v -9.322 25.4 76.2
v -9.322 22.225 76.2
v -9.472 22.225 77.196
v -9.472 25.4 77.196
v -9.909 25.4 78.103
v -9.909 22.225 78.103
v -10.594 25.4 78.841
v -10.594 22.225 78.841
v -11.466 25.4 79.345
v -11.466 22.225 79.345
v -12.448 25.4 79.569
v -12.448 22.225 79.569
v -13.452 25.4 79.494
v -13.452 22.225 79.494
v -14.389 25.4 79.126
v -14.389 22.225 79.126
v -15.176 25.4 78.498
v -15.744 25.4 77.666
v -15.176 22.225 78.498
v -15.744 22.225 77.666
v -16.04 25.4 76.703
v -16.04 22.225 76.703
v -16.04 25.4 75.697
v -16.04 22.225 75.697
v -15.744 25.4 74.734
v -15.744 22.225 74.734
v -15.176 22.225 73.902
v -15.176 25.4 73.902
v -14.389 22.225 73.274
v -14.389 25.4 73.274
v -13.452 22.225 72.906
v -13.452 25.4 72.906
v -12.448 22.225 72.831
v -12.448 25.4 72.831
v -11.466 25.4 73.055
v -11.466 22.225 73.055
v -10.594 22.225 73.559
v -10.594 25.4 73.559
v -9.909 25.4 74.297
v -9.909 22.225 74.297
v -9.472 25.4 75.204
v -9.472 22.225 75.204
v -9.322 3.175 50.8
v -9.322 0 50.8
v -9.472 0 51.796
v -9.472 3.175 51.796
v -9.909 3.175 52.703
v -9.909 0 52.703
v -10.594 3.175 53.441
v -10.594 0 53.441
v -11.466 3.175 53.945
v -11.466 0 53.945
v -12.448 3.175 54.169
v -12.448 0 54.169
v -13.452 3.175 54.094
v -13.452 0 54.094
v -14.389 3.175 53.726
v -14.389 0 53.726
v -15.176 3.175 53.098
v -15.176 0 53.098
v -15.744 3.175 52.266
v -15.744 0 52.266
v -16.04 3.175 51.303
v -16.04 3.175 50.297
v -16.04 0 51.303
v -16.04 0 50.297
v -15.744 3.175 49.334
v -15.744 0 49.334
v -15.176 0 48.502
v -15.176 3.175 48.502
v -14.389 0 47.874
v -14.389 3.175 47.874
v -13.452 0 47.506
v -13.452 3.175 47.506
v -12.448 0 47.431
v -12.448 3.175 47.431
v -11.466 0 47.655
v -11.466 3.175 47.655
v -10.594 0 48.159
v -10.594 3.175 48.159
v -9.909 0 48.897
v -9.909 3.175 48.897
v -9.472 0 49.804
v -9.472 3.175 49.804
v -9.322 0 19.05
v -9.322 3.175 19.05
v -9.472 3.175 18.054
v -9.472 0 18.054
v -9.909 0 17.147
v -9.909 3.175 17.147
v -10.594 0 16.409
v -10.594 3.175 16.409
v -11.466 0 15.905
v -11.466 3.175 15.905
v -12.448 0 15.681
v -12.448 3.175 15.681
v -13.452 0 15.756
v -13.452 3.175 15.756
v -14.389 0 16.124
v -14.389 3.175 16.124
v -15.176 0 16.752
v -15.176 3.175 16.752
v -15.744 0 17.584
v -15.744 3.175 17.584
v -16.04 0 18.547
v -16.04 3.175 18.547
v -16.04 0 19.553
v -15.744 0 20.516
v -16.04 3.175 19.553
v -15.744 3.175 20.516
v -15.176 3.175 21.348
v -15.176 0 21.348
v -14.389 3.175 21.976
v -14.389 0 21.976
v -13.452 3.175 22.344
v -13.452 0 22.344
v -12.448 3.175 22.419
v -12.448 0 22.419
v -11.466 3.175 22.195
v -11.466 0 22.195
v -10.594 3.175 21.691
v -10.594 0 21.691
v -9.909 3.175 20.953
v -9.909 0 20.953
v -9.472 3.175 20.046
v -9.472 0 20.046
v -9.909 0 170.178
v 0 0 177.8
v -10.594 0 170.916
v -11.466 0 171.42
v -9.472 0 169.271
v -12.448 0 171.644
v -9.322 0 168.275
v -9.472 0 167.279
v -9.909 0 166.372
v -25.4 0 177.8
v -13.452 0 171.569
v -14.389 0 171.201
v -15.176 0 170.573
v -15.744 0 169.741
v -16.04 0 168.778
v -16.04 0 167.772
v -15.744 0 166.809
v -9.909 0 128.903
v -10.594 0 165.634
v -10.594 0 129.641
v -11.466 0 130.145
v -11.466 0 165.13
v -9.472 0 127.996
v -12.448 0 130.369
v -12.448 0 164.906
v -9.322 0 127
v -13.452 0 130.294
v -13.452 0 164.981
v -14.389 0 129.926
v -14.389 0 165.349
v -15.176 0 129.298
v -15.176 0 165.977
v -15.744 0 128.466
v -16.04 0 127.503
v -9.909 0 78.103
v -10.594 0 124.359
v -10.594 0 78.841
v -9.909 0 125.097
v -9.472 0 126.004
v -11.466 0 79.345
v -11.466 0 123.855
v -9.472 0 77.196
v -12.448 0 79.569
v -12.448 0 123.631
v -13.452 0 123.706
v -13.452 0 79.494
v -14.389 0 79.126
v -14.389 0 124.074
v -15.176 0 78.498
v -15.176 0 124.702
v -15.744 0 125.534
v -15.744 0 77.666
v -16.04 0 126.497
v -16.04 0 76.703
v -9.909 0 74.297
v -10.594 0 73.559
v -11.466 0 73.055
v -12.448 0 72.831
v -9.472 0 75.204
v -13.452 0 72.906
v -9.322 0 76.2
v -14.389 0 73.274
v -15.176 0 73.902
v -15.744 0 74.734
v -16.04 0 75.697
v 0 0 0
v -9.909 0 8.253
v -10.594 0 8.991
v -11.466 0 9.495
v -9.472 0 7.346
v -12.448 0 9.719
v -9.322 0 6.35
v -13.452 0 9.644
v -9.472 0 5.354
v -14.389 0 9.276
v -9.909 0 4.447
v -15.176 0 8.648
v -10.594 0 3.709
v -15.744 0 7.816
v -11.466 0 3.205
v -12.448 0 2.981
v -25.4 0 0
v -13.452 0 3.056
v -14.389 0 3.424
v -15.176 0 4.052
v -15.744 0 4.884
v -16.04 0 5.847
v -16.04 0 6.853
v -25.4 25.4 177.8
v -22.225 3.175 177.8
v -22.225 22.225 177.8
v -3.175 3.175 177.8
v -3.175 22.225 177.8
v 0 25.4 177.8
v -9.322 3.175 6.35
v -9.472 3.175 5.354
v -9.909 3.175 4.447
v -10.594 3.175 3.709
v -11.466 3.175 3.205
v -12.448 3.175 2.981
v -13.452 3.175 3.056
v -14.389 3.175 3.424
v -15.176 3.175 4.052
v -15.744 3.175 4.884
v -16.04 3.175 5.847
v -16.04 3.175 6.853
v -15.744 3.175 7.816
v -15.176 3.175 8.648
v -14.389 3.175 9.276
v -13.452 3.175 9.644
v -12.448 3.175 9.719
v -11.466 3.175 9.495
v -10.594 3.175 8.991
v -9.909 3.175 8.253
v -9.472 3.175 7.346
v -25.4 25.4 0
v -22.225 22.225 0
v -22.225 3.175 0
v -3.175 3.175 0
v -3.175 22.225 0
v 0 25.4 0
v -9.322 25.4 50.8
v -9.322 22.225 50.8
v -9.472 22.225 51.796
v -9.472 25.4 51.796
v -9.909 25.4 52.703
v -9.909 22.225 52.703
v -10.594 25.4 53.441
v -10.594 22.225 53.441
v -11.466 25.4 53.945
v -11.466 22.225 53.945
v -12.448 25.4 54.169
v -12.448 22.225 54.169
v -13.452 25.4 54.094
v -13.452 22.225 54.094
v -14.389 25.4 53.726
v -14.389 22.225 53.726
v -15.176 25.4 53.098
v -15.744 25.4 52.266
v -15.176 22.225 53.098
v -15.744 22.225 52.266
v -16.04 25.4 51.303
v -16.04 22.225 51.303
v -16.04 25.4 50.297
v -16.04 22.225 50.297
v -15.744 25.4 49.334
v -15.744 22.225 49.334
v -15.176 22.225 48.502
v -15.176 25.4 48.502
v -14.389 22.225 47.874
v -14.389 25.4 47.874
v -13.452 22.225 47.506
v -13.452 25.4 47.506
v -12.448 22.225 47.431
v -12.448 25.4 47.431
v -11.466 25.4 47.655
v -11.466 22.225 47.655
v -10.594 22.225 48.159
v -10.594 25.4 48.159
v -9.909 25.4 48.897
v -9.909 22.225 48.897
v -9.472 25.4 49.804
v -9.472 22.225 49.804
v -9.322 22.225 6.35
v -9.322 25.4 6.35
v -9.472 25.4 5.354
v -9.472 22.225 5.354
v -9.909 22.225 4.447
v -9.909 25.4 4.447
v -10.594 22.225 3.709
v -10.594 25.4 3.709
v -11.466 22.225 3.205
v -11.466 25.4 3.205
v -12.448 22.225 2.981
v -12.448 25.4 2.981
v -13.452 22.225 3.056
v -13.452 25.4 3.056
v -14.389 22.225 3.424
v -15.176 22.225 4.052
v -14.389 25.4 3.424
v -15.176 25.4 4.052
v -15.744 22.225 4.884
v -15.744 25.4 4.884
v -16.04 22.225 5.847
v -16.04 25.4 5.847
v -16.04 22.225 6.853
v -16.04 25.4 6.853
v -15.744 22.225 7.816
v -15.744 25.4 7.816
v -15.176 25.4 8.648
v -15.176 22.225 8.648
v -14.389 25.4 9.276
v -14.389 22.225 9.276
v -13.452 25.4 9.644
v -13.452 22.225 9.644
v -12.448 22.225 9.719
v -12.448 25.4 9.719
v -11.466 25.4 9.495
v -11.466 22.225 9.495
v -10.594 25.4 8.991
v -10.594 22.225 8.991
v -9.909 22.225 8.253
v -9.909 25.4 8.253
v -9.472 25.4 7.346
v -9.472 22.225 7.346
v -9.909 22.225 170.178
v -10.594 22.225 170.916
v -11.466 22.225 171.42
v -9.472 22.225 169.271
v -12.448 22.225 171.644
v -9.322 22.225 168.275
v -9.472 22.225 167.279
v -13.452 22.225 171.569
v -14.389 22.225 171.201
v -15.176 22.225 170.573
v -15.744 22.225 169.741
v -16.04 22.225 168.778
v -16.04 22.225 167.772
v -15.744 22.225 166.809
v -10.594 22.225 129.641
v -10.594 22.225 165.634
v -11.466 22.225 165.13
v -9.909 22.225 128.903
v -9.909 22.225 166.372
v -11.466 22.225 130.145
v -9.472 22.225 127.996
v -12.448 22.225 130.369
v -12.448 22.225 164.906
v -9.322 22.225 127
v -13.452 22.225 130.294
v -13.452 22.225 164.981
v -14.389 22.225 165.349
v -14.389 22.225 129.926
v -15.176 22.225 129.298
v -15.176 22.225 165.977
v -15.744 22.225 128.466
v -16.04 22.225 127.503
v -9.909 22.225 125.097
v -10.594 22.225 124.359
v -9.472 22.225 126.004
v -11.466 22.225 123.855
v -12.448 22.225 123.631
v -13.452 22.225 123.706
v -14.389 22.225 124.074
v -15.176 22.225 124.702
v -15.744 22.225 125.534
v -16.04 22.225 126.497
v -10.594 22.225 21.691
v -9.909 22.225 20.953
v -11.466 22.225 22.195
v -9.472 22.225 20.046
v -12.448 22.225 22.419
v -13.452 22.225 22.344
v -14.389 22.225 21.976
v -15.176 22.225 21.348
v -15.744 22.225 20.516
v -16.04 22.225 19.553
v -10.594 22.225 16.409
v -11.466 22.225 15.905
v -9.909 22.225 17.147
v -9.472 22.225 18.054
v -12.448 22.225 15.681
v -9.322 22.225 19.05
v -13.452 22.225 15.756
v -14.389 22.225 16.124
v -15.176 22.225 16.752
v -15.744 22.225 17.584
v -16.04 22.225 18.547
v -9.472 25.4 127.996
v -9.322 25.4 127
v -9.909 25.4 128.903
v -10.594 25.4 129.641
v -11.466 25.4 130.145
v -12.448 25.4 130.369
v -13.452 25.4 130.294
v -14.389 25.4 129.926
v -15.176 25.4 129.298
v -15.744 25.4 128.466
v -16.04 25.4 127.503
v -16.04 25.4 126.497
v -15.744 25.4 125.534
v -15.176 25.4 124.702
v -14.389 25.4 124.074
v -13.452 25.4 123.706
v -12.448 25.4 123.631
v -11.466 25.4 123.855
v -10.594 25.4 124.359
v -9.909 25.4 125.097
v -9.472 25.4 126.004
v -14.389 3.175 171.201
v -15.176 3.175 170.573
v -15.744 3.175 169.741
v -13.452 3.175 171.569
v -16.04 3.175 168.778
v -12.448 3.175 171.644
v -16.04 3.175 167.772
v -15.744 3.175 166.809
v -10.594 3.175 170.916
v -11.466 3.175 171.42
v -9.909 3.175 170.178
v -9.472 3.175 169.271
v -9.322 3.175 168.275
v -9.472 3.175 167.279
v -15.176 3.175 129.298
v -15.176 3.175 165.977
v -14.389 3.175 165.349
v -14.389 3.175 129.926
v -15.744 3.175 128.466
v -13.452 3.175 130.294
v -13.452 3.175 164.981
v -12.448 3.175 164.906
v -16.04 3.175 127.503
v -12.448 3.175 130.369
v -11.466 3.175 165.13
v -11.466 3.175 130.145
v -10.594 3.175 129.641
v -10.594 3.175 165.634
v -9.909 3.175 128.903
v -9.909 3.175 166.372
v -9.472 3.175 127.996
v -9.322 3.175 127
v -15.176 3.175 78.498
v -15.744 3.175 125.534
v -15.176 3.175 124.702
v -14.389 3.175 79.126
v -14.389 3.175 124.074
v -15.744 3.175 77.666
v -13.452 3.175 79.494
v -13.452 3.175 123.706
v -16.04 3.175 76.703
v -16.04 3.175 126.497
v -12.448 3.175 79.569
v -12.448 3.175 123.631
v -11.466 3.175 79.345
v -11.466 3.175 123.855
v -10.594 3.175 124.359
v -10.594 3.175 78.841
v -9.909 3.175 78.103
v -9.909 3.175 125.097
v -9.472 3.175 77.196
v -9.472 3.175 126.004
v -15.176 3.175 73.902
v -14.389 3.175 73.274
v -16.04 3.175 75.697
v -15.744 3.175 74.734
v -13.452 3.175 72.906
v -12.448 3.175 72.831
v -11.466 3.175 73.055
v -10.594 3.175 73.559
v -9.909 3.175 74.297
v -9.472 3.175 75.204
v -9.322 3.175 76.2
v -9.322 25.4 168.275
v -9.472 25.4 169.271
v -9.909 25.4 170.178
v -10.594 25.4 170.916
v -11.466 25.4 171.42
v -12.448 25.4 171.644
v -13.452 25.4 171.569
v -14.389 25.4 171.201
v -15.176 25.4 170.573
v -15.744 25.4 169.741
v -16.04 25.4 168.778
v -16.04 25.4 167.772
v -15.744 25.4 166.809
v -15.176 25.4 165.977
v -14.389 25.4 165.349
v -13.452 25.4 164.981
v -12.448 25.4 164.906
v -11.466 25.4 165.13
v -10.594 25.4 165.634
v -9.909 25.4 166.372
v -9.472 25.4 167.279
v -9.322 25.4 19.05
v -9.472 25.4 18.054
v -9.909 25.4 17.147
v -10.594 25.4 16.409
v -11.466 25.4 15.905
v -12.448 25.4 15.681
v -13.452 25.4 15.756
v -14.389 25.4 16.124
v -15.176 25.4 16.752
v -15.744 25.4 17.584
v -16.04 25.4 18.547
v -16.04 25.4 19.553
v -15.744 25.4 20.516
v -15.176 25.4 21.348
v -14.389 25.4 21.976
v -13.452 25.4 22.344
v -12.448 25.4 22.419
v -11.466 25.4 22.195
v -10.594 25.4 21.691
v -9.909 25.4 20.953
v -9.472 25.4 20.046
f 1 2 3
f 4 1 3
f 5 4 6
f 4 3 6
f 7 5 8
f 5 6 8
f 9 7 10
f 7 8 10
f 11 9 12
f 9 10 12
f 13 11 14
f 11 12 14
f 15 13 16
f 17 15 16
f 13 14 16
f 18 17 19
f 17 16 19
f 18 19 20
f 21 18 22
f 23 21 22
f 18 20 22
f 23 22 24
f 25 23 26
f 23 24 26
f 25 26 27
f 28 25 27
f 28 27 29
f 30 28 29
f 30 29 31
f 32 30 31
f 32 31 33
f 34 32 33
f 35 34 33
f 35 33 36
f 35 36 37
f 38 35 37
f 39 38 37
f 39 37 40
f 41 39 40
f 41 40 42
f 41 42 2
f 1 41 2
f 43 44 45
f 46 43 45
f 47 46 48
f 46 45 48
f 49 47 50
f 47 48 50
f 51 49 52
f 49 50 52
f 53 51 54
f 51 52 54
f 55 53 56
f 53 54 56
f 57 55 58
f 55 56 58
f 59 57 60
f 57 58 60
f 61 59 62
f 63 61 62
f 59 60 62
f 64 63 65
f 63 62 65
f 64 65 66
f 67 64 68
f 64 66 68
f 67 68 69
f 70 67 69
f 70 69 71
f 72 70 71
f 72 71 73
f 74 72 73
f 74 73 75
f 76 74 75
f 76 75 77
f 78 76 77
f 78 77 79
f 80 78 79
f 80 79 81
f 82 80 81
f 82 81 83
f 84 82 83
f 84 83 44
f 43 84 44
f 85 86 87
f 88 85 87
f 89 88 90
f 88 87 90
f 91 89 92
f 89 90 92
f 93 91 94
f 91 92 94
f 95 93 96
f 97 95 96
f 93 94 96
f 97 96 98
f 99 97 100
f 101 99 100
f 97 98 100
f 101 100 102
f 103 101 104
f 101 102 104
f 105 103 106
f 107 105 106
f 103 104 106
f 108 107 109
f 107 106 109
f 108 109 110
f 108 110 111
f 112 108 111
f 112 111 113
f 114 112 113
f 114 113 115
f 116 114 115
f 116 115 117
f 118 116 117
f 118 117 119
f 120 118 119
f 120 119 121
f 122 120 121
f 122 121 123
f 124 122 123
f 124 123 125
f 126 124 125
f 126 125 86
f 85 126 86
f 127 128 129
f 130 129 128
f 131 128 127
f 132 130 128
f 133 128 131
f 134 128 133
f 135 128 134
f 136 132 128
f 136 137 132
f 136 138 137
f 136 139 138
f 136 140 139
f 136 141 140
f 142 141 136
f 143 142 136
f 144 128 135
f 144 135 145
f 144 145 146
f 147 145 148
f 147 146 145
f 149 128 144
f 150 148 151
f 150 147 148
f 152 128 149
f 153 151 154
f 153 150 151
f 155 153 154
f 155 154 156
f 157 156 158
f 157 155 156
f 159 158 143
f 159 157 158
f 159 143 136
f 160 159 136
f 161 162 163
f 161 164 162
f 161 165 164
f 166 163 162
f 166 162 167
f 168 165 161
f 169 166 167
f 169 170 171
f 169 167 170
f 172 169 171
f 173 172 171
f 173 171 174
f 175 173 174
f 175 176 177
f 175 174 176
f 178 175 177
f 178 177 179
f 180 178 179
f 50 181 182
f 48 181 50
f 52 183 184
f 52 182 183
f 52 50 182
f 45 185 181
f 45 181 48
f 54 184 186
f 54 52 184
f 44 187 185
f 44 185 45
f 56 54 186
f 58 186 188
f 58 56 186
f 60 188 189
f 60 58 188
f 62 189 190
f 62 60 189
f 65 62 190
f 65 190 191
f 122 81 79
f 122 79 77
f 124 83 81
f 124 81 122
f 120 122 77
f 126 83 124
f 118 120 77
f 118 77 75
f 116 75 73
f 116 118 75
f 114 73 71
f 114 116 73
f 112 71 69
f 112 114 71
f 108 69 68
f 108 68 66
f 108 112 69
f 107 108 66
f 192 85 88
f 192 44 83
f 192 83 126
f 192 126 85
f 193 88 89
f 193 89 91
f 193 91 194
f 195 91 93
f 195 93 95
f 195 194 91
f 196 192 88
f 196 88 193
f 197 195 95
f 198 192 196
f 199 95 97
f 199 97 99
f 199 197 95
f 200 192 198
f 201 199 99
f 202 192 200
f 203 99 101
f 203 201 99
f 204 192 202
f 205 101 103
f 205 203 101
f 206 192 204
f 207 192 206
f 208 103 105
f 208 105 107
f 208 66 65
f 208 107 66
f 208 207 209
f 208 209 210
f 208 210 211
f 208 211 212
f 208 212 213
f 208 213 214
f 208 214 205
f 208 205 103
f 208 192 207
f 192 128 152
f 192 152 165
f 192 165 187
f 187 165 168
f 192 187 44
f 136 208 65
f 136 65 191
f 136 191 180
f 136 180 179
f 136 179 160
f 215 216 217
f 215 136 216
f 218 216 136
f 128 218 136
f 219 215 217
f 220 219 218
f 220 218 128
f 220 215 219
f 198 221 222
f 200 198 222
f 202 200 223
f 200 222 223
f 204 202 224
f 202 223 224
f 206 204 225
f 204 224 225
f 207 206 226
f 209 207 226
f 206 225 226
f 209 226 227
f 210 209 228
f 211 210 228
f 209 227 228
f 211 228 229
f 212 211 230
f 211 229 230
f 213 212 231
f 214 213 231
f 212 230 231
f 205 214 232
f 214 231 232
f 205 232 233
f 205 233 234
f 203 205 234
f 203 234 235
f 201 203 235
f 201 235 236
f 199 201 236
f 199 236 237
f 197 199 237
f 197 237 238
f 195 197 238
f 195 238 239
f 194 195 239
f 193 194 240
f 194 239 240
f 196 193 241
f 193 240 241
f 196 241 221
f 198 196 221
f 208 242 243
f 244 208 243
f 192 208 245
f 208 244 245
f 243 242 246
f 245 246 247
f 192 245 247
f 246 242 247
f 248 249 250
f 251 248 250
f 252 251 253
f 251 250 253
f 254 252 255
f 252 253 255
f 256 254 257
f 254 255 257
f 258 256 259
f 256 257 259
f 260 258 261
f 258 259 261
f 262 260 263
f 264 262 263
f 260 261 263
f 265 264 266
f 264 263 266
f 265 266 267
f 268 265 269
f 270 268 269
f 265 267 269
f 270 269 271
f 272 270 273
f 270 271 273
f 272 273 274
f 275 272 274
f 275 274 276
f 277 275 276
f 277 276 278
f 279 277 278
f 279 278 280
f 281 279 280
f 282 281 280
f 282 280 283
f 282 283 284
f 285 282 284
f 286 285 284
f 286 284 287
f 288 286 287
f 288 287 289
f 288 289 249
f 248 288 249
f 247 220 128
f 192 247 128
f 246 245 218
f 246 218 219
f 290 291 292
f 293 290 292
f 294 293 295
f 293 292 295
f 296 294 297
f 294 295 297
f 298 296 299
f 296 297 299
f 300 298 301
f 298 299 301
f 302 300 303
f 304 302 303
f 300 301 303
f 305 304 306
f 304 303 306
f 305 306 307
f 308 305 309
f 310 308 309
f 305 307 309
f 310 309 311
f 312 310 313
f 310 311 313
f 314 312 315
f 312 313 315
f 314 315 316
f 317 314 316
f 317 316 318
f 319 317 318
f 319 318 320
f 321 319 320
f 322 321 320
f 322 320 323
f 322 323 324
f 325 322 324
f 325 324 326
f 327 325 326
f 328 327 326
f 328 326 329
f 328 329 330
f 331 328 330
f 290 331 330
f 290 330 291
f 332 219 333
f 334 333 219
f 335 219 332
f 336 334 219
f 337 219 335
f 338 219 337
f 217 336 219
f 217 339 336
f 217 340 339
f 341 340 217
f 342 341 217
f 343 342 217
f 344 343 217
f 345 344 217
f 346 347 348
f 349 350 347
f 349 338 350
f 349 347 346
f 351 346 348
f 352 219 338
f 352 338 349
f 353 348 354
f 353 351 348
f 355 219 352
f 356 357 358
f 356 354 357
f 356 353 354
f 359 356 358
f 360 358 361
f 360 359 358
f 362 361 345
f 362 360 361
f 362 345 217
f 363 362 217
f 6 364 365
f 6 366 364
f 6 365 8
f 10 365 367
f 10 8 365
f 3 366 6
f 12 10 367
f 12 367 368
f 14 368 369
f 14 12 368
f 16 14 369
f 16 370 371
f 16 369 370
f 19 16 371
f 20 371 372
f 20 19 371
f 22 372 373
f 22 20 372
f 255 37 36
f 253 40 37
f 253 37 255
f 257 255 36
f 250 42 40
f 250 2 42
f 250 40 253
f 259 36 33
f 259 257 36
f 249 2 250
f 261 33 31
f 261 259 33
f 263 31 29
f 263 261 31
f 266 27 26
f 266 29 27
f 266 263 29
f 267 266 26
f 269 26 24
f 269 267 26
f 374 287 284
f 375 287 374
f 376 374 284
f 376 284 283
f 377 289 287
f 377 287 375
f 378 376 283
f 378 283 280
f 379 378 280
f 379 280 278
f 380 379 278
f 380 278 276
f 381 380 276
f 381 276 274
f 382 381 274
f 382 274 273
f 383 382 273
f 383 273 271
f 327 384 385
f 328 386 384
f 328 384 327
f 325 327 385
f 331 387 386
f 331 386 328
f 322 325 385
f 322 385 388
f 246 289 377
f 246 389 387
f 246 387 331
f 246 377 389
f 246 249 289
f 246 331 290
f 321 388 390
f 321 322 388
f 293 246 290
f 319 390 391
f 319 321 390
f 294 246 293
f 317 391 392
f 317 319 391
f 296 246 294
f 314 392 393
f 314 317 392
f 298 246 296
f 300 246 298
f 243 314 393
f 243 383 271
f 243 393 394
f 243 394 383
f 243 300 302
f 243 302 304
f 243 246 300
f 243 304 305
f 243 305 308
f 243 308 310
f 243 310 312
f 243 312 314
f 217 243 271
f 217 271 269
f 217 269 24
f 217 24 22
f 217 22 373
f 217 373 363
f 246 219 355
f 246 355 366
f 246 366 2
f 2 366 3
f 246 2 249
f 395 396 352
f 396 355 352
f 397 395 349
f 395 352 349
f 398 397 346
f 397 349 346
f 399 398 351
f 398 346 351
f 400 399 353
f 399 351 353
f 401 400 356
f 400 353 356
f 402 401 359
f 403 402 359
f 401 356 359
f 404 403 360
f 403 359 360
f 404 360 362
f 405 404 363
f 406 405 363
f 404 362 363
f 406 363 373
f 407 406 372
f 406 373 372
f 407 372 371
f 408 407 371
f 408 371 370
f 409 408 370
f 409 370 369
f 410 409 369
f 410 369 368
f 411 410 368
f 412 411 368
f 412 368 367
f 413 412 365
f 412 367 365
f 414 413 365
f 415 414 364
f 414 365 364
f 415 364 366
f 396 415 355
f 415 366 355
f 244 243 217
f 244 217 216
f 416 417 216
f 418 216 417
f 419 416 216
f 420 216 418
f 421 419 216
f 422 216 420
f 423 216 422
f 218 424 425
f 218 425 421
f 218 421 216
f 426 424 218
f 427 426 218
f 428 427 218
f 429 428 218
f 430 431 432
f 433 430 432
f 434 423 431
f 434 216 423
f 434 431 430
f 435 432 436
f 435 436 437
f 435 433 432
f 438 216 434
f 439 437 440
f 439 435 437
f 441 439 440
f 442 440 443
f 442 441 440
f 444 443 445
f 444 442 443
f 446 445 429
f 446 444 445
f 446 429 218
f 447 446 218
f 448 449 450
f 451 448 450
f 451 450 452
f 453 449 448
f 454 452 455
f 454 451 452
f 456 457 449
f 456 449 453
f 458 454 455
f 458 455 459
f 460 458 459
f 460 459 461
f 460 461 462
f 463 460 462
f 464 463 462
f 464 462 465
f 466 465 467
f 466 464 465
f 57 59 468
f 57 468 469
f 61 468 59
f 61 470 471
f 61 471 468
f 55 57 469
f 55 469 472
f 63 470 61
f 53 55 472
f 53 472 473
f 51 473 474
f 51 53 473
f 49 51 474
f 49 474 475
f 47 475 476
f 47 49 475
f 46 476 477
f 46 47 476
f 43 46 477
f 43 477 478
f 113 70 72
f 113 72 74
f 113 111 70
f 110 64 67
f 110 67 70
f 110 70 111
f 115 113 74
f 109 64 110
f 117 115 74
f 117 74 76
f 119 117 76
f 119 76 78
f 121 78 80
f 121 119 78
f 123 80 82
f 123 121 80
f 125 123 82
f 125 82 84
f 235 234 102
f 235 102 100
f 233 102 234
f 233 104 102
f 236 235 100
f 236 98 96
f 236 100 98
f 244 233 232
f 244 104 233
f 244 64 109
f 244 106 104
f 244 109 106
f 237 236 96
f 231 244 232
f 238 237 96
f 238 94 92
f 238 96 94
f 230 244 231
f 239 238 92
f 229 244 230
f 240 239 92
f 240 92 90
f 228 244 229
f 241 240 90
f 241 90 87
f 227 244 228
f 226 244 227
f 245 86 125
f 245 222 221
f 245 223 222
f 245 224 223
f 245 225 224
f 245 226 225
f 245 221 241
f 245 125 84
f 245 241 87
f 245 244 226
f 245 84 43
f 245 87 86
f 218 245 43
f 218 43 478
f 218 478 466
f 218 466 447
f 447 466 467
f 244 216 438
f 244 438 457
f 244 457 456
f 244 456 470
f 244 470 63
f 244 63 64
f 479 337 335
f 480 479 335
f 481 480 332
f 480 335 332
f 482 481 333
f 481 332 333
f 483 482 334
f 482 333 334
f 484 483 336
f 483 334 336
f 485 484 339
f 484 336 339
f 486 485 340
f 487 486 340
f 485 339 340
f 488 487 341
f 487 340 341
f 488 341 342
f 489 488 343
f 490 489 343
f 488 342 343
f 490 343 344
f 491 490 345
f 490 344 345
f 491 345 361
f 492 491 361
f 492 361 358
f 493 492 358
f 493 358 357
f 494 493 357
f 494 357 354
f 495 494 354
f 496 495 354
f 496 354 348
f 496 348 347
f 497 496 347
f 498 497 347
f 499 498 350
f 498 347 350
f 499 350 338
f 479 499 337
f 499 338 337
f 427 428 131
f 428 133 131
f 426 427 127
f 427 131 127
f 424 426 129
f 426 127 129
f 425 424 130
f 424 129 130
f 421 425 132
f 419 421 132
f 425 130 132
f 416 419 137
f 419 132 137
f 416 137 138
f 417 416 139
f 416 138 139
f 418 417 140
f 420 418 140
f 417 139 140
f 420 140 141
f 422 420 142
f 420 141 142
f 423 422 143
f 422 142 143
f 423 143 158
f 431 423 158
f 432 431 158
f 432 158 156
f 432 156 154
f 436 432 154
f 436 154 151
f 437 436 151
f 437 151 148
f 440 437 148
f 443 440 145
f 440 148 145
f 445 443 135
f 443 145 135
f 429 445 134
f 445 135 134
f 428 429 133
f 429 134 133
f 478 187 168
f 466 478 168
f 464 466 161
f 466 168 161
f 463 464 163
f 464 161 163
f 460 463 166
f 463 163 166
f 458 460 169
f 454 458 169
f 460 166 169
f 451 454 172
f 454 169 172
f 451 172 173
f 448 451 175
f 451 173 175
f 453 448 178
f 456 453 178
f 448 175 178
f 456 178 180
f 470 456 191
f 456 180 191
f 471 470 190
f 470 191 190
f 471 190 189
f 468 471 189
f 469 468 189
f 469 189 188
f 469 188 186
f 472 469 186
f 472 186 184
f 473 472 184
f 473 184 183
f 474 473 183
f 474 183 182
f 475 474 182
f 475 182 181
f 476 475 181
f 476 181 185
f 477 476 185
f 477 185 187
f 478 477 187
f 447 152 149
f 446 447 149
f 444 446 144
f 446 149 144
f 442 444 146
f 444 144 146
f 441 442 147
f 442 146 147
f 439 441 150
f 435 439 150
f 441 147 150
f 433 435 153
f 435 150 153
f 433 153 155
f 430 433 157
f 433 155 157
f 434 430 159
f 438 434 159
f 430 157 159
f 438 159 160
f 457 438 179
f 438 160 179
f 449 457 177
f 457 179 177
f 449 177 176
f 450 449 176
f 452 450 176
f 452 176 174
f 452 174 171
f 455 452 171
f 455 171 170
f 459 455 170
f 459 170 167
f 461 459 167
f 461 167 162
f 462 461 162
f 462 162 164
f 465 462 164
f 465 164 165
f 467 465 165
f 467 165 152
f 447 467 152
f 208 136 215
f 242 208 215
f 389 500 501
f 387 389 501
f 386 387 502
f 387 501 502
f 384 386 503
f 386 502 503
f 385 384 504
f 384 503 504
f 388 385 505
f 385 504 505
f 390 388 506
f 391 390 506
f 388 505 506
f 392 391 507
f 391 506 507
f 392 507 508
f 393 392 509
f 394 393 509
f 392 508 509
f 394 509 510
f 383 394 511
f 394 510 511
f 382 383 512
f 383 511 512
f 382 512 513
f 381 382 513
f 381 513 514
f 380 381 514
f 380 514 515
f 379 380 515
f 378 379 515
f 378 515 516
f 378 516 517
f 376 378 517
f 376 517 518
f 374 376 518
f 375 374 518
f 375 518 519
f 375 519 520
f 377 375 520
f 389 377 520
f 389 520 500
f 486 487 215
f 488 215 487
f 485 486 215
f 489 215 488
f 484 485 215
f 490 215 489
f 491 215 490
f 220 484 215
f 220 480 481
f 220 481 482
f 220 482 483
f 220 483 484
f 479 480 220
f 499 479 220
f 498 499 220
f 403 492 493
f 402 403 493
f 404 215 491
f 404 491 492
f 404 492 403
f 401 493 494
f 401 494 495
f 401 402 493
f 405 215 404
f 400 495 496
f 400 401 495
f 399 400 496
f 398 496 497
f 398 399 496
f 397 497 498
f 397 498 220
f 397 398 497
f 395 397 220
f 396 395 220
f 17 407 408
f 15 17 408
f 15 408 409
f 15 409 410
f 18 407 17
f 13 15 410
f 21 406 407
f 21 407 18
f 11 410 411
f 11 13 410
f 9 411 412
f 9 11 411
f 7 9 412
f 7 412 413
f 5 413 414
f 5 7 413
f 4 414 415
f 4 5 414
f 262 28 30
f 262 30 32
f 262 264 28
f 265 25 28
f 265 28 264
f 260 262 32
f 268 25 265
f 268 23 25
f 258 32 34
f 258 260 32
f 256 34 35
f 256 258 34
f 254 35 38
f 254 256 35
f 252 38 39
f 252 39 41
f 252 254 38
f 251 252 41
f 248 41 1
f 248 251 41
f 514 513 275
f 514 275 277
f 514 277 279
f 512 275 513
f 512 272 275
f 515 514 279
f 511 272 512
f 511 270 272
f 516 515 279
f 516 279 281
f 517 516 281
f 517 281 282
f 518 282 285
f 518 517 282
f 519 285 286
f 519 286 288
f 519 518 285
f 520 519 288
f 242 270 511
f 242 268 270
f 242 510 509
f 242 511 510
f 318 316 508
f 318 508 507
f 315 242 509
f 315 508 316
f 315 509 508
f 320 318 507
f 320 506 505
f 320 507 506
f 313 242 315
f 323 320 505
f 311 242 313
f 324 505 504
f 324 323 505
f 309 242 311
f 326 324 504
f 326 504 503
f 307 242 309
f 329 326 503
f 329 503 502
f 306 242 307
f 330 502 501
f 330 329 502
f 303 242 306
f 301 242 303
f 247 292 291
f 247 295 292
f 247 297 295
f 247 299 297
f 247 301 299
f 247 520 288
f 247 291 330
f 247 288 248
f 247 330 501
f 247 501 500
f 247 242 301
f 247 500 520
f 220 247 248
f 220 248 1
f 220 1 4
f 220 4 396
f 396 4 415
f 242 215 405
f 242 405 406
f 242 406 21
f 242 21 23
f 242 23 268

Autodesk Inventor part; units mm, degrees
ref_plane "YZ Plane" through (0, 0, 0) normal (1, 0, 0) x (0, 1, 0)
ref_plane "XZ Plane" through (0, 0, 0) normal (0, 1, 0) x (-1, 0, 0)
ref_plane "XY Plane" through (0, 0, 0) normal (0, 0, 1) x (1, 0, 0)
sketch "Sketch1" plane through (0, 0, 0) normal (0, 0, 1) x (1, 0, 0)
  line L0 (0, 0) -> (-25.4, 0)
  line L1 (-25.4, 0) -> (-25.4, 25.4)
  line L2 (-25.4, 25.4) -> (0, 25.4)
  line L3 (0, 25.4) -> (0, 0)
  line L4 (-3.175, 22.225) -> (-22.225, 22.225)
  line L5 (-22.225, 22.225) -> (-22.225, 3.175)
  line L6 (-22.225, 3.175) -> (-3.175, 3.175)
  line L7 (-3.175, 3.175) -> (-3.175, 22.225)
  dimension "d0" = 25.4
  dimension "d2" = 25.4
  dimension "d3" = 3.175
extrude "Extrusion1" add sketch "Sketch1" along normal blind 177.8
sketch "Sketch2" plane through (-25.4, 25.4, 0) normal (0, 1, 0) x (1, 0, 0)
  circle A0 centre (12.7, -19.05) radius 3.3782 projected
  circle A1 centre (12.7, -6.35) radius 3.3782 projected
extrude "Extrusion2" cut sketch "Sketch2" against normal blind 25.4
sketch "Sketch3" plane through (-25.4, 0, 0) normal (0, -1, 0) x (1, 0, 0)
  circle A0 centre (12.7, 76.2) radius 3.3782 projected
  line L0 (336.55, 50.8) -> (-157.1625, 50.8) projected
  circle A1 centre (12.7, 50.8) radius 3.3782 projected
extrude "Extrusion3" cut sketch "Sketch3" against normal blind 25.4
sketch "Sketch5" plane through (-25.4, 0, 0) normal (0, -1, 0) x (1, 0, 0)
  circle A0 centre (12.7, 127) radius 3.3782 projected
  circle A1 centre (12.7, 168.275) radius 3.3782 projected
extrude "Extrusion4" cut sketch "Sketch5" against normal blind 25.4
properties part number "winch mount" material "Aluminum 6061"
